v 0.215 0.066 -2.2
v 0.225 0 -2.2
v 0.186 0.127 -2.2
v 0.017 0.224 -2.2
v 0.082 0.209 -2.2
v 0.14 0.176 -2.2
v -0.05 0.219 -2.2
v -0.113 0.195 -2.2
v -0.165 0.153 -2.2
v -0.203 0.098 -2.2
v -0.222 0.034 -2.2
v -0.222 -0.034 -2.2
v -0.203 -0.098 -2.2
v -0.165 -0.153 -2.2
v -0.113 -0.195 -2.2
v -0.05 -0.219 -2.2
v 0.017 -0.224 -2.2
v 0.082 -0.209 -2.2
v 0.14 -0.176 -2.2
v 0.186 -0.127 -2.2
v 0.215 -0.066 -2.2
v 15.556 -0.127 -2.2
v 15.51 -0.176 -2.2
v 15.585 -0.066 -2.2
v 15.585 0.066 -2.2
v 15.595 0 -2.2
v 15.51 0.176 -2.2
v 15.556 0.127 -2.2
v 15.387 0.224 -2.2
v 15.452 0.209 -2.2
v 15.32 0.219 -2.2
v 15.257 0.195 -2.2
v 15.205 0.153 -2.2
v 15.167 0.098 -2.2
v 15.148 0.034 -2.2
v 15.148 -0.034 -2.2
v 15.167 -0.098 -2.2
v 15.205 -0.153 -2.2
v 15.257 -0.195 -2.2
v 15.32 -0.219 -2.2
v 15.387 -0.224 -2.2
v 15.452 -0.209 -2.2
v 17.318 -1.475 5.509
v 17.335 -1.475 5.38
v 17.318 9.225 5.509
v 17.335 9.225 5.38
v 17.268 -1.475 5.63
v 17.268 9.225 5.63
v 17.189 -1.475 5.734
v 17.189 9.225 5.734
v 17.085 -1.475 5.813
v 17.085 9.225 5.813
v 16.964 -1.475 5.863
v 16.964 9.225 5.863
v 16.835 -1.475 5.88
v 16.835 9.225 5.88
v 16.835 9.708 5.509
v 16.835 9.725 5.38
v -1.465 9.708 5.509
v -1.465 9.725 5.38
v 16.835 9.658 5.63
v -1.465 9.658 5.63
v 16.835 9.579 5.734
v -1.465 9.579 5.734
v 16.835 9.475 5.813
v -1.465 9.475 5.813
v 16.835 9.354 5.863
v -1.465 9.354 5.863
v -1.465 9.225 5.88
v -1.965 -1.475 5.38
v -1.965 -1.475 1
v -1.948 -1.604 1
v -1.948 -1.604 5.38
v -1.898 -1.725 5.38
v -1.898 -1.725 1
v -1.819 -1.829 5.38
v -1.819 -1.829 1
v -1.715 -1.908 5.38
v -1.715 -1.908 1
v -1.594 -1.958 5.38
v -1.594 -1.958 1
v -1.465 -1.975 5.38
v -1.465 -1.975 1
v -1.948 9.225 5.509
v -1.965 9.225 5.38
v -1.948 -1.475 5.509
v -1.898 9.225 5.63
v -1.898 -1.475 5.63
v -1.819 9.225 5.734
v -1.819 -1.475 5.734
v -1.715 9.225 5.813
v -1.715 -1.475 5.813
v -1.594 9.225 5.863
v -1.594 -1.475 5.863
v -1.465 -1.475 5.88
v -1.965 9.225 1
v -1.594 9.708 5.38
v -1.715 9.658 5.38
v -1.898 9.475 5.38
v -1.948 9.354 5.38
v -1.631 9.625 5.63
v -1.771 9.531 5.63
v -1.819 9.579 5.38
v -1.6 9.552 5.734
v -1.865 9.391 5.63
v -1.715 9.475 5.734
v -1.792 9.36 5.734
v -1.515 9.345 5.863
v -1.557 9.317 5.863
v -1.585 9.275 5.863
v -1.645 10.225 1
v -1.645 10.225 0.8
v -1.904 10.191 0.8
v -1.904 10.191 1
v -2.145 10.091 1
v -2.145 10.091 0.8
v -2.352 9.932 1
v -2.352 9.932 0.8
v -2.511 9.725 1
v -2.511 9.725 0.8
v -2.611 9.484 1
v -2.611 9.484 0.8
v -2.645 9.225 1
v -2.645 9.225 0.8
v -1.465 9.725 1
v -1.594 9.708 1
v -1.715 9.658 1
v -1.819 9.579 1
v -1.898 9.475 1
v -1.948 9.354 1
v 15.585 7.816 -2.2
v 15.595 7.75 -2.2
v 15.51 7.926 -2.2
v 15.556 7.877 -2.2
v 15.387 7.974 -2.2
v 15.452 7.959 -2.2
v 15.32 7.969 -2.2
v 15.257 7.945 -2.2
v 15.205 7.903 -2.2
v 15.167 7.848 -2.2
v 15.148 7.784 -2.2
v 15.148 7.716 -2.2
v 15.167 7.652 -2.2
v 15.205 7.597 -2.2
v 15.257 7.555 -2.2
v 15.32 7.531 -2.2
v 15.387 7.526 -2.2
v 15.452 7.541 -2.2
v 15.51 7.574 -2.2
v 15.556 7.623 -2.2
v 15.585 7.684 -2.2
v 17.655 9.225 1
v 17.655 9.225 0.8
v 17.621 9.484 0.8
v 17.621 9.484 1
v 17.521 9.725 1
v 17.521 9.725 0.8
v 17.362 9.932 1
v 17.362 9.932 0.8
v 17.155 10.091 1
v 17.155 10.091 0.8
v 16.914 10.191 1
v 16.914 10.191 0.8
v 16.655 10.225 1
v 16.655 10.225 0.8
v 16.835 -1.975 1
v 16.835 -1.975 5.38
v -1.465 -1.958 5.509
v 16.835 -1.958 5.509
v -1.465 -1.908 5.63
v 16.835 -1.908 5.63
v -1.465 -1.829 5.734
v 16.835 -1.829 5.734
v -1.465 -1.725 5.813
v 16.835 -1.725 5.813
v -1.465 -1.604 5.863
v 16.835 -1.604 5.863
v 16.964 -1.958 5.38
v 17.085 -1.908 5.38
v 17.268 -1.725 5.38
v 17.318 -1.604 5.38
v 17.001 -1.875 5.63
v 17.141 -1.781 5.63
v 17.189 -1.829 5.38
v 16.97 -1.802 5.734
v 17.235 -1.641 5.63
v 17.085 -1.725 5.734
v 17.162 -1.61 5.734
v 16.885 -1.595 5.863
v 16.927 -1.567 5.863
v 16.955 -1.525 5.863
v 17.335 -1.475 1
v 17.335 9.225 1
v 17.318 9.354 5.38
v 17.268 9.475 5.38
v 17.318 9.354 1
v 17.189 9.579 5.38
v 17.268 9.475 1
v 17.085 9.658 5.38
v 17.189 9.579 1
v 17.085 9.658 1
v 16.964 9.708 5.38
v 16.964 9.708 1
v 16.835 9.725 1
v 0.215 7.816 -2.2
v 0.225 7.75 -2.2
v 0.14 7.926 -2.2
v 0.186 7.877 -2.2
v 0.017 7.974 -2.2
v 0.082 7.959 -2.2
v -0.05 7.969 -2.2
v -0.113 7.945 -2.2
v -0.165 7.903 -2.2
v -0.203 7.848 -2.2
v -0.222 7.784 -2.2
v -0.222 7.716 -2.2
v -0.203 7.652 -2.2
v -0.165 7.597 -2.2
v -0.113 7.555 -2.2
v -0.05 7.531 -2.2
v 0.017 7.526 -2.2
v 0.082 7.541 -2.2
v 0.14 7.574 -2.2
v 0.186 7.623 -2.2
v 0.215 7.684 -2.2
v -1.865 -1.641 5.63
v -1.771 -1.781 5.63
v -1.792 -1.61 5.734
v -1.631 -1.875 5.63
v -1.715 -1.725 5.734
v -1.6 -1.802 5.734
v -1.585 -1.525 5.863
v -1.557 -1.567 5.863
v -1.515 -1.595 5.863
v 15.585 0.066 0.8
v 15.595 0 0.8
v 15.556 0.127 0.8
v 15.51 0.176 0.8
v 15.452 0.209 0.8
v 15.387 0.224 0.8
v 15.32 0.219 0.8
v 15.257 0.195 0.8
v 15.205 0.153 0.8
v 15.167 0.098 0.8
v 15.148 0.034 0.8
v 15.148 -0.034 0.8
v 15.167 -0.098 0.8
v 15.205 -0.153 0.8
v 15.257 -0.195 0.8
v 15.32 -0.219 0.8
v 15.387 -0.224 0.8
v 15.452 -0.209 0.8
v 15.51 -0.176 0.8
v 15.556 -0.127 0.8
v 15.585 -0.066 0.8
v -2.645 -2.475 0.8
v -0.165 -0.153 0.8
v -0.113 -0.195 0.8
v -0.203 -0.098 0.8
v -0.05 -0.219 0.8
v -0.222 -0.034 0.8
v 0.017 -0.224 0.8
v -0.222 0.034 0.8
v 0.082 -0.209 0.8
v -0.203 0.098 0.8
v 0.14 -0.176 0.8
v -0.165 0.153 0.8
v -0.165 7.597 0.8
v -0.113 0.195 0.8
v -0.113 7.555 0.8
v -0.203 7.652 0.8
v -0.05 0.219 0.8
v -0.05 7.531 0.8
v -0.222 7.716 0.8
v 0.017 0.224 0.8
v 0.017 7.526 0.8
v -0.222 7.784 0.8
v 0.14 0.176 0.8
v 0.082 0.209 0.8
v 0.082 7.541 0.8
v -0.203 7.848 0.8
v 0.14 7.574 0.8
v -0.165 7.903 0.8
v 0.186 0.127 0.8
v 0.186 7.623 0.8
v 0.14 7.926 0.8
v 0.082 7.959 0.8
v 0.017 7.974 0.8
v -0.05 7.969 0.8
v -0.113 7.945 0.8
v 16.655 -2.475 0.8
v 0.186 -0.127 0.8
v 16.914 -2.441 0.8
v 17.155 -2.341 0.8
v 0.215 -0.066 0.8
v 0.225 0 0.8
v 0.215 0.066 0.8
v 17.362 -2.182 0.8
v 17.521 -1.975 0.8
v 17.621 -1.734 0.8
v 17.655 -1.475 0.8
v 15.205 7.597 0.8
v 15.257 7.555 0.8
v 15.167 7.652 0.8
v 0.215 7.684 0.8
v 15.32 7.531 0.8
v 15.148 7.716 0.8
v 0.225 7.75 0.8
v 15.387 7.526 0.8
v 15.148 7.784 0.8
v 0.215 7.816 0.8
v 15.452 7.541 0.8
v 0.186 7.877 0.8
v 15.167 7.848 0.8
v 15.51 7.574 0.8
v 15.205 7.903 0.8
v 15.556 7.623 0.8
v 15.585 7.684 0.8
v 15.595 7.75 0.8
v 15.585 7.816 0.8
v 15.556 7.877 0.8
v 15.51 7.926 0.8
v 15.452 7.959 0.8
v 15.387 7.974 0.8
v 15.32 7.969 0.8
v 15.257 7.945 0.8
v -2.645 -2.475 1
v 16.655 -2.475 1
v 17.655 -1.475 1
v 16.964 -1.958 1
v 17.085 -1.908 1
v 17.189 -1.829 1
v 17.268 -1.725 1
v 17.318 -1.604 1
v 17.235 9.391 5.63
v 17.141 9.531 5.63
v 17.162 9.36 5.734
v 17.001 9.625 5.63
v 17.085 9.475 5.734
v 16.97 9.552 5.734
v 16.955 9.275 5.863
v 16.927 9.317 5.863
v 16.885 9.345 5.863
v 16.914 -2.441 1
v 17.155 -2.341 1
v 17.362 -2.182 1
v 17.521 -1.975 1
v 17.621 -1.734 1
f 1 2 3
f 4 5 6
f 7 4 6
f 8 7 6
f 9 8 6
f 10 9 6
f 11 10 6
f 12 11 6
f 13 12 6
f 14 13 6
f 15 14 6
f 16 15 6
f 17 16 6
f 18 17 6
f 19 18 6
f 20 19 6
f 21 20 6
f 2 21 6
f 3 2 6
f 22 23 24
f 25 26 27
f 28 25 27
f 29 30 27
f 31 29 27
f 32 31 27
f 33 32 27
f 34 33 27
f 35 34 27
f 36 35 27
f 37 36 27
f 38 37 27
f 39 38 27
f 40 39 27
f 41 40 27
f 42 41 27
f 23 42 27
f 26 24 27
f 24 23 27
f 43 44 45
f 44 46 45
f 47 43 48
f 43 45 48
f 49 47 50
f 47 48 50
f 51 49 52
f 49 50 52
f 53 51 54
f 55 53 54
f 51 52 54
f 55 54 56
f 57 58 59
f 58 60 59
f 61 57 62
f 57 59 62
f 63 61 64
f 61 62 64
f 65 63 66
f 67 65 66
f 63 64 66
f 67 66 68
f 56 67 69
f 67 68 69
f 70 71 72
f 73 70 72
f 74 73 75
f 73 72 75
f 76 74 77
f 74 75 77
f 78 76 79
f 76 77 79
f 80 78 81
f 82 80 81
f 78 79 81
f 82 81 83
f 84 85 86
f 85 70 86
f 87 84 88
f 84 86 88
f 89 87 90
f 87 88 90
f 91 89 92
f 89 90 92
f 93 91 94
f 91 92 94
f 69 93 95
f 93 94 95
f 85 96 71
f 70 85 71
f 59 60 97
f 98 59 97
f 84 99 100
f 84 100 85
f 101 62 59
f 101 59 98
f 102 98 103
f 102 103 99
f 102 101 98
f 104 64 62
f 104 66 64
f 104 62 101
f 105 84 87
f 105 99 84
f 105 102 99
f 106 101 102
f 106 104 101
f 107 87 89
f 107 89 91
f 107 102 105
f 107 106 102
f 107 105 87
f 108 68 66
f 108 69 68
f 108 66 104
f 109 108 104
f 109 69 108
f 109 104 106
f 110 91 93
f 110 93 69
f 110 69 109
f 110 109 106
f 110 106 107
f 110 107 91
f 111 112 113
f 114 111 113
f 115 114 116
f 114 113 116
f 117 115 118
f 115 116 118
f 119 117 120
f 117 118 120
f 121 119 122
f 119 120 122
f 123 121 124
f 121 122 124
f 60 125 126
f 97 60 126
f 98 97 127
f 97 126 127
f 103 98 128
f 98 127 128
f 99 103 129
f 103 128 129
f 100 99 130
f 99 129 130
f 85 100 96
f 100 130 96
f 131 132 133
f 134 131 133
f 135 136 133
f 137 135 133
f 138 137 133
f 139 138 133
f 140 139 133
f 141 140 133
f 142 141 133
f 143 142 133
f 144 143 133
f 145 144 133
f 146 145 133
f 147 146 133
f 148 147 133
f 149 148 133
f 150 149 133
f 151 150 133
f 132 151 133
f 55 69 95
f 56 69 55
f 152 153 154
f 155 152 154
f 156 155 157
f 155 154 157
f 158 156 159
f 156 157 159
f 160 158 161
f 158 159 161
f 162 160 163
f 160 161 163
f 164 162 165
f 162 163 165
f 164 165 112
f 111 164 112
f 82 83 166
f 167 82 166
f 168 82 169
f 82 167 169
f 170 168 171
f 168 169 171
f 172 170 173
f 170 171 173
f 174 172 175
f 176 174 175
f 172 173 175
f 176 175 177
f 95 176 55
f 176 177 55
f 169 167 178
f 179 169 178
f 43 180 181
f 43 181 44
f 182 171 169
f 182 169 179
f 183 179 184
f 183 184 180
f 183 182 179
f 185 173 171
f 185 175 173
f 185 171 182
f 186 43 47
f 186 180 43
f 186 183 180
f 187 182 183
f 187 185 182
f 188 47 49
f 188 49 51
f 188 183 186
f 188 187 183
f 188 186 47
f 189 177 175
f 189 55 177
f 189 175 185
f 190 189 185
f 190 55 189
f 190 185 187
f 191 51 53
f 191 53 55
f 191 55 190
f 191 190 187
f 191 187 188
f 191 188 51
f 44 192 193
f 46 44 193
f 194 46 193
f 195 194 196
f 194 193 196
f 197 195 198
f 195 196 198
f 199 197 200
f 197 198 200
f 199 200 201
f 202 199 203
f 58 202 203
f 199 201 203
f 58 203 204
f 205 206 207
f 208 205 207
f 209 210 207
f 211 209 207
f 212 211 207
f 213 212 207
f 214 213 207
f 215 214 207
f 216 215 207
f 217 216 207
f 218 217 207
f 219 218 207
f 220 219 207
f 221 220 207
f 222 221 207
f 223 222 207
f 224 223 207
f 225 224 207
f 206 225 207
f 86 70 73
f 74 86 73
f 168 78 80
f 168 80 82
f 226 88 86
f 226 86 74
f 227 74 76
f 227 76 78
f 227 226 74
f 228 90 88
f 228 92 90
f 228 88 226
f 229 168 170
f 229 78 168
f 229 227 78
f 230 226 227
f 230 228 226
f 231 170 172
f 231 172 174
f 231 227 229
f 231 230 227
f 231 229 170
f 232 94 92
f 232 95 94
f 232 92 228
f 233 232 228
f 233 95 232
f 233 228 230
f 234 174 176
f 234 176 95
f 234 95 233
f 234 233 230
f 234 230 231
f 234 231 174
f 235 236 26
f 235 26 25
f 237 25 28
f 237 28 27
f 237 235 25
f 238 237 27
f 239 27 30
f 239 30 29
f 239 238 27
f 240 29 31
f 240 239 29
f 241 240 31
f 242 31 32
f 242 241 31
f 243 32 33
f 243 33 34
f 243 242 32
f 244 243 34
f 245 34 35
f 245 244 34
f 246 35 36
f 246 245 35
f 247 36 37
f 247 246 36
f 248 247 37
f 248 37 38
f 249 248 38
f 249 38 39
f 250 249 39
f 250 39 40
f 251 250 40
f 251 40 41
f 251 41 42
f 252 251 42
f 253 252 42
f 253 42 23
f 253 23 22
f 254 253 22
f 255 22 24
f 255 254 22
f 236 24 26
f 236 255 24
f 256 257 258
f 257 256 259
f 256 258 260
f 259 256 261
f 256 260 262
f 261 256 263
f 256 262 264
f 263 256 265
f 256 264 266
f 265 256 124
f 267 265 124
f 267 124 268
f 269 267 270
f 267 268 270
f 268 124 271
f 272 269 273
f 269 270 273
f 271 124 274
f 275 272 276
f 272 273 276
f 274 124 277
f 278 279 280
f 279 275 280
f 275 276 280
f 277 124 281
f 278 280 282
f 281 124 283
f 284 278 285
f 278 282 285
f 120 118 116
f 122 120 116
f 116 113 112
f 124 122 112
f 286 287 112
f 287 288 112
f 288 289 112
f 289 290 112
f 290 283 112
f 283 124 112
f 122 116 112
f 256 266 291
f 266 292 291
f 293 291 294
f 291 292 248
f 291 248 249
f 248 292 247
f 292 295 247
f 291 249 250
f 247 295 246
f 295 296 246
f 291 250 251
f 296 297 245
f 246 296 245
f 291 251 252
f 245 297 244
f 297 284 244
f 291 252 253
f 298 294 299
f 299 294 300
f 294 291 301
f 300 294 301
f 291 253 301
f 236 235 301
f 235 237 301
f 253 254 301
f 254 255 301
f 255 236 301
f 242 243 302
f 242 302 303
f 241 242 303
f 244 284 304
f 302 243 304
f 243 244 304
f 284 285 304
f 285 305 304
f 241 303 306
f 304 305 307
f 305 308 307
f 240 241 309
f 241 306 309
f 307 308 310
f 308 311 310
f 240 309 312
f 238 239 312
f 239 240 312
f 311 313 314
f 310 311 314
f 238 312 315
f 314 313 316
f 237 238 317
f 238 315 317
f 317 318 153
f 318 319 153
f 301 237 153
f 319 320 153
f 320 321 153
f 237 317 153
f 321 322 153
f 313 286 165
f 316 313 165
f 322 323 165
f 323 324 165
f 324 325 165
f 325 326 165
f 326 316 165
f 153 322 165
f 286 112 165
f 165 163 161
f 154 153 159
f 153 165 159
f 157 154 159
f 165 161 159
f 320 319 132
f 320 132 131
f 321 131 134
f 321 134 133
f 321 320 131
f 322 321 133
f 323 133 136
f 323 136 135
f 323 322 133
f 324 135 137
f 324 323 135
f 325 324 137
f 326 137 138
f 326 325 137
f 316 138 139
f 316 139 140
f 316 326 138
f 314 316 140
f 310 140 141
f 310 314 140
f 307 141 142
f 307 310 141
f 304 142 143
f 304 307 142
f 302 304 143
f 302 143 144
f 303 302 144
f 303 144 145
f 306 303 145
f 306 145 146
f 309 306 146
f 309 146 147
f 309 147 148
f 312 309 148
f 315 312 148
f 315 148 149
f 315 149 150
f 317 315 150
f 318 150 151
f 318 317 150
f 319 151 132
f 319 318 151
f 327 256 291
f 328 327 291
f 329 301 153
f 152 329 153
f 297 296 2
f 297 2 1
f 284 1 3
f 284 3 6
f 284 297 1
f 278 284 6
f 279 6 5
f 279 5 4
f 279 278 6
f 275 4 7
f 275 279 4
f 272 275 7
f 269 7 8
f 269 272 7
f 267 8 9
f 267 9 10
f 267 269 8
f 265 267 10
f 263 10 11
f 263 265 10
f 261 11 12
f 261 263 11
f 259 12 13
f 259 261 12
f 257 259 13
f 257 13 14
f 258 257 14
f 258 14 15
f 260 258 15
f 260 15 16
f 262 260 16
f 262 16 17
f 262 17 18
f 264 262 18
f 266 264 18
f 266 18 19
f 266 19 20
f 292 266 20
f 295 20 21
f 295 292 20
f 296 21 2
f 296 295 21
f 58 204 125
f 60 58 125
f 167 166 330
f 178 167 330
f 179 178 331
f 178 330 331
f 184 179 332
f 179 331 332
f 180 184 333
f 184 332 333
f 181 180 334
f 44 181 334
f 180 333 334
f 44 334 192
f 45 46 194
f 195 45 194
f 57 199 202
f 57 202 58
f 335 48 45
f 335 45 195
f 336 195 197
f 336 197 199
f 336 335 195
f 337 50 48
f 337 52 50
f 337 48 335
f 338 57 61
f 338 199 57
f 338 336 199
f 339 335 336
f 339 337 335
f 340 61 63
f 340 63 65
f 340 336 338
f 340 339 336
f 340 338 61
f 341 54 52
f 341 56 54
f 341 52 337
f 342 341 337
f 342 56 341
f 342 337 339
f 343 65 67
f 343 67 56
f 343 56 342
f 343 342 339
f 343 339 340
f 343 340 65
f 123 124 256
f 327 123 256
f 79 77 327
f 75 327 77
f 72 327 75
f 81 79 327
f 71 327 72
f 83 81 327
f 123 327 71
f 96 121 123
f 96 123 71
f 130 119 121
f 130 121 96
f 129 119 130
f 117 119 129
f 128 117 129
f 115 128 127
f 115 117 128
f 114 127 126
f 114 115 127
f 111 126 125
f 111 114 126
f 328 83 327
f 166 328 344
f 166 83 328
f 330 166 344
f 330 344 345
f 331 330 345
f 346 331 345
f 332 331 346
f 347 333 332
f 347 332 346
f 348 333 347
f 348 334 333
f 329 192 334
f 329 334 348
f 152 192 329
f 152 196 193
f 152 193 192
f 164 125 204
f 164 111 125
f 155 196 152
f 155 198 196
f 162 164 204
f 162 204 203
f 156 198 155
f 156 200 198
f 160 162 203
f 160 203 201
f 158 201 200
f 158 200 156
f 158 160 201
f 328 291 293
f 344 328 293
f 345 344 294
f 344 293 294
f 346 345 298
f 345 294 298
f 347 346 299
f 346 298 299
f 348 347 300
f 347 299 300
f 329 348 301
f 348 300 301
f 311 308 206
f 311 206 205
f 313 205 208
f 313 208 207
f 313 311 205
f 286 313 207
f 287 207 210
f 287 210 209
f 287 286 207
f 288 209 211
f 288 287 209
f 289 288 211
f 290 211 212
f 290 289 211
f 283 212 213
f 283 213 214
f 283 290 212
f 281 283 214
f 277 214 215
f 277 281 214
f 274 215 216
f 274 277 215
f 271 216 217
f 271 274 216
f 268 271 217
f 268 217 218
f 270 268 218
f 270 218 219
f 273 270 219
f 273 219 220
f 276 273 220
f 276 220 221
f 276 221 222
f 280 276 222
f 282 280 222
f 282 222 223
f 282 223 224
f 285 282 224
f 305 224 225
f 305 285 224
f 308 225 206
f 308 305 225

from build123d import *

# Parameters (mm, degrees)
PAD001_DEPTH = 0.2
PAD002_DEPTH = 5.08
FILLET_R     = 0.5
SKETCH_R     = 0.225
PAD_DEPTH    = 3


with BuildPart() as pad001:
    # Sketch001 → Pad001 (new body)
    with BuildSketch(Plane.XY.offset(0.8)):
        with BuildLine():
            Line((-2.645, -2.475), (16.655, -2.475))
            ThreePointArc((16.655, -2.475), (17.362107, -2.182107), (17.655, -1.475))
            Line((17.655, -1.475), (17.655, 9.225))
            ThreePointArc((17.655, 9.225), (17.362107, 9.932107), (16.655, 10.225))
            Line((16.655, 10.225), (-1.645, 10.225))
            ThreePointArc((-1.645, 10.225), (-2.352107, 9.932107), (-2.645, 9.225))
            Line((-2.645, 9.225), (-2.645, -2.475))
        make_face()
    extrude(amount=PAD001_DEPTH)


with BuildPart() as fillet_body:
    # Sketch002 → Pad002 (new body)
    with BuildSketch(Plane.XY.offset(0.8)):
        with BuildLine():
            Line((-1.465, -1.975), (16.835, -1.975))
            ThreePointArc((16.835, -1.975), (17.188553, -1.828553), (17.335, -1.475))
            Line((17.335, -1.475), (17.335, 9.225))
            ThreePointArc((17.335, 9.225), (17.188553, 9.578553), (16.835, 9.725))
            Line((16.835, 9.725), (-1.465, 9.725))
            ThreePointArc((-1.465, 9.725), (-1.818553, 9.578553), (-1.965, 9.225))
            Line((-1.965, 9.225), (-1.965, -1.475))
            ThreePointArc((-1.965, -1.475), (-1.818553, -1.828553), (-1.465, -1.975))
        make_face()
    extrude(amount=PAD002_DEPTH)

    # Fillet
    fillet_edges = [fillet_body.edges().sort_by_distance(p)[0] for p in [
        (-1.818553, -1.828553, 5.88),
        (7.685, -1.975, 5.88),
        (-1.965, 3.875, 5.88),
        (-1.818553, 9.578553, 5.88),
        (7.685, 9.725, 5.88),
        (17.188553, 9.578553, 5.88),
        (17.335, 3.875, 5.88),
        (17.188553, -1.828553, 5.88),
    ]]
    fillet(fillet_edges, radius=FILLET_R)


with BuildPart() as pad_mp_cp:
    # Sketch → Pad (new body)
    with BuildSketch(Plane.XY.offset(0.8)):
        Circle(SKETCH_R)
        with Locations((15.37, 0)):
            Circle(SKETCH_R)
        with Locations((15.37, 7.75)):
            Circle(SKETCH_R)
        with Locations((0, 7.75)):
            Circle(SKETCH_R)
    extrude(amount=-PAD_DEPTH)

    # Pad_mp_cp: union Pad001, Fillet body
    add(pad001.part)
    add(fillet_body.part)


solid = pad_mp_cp.part
